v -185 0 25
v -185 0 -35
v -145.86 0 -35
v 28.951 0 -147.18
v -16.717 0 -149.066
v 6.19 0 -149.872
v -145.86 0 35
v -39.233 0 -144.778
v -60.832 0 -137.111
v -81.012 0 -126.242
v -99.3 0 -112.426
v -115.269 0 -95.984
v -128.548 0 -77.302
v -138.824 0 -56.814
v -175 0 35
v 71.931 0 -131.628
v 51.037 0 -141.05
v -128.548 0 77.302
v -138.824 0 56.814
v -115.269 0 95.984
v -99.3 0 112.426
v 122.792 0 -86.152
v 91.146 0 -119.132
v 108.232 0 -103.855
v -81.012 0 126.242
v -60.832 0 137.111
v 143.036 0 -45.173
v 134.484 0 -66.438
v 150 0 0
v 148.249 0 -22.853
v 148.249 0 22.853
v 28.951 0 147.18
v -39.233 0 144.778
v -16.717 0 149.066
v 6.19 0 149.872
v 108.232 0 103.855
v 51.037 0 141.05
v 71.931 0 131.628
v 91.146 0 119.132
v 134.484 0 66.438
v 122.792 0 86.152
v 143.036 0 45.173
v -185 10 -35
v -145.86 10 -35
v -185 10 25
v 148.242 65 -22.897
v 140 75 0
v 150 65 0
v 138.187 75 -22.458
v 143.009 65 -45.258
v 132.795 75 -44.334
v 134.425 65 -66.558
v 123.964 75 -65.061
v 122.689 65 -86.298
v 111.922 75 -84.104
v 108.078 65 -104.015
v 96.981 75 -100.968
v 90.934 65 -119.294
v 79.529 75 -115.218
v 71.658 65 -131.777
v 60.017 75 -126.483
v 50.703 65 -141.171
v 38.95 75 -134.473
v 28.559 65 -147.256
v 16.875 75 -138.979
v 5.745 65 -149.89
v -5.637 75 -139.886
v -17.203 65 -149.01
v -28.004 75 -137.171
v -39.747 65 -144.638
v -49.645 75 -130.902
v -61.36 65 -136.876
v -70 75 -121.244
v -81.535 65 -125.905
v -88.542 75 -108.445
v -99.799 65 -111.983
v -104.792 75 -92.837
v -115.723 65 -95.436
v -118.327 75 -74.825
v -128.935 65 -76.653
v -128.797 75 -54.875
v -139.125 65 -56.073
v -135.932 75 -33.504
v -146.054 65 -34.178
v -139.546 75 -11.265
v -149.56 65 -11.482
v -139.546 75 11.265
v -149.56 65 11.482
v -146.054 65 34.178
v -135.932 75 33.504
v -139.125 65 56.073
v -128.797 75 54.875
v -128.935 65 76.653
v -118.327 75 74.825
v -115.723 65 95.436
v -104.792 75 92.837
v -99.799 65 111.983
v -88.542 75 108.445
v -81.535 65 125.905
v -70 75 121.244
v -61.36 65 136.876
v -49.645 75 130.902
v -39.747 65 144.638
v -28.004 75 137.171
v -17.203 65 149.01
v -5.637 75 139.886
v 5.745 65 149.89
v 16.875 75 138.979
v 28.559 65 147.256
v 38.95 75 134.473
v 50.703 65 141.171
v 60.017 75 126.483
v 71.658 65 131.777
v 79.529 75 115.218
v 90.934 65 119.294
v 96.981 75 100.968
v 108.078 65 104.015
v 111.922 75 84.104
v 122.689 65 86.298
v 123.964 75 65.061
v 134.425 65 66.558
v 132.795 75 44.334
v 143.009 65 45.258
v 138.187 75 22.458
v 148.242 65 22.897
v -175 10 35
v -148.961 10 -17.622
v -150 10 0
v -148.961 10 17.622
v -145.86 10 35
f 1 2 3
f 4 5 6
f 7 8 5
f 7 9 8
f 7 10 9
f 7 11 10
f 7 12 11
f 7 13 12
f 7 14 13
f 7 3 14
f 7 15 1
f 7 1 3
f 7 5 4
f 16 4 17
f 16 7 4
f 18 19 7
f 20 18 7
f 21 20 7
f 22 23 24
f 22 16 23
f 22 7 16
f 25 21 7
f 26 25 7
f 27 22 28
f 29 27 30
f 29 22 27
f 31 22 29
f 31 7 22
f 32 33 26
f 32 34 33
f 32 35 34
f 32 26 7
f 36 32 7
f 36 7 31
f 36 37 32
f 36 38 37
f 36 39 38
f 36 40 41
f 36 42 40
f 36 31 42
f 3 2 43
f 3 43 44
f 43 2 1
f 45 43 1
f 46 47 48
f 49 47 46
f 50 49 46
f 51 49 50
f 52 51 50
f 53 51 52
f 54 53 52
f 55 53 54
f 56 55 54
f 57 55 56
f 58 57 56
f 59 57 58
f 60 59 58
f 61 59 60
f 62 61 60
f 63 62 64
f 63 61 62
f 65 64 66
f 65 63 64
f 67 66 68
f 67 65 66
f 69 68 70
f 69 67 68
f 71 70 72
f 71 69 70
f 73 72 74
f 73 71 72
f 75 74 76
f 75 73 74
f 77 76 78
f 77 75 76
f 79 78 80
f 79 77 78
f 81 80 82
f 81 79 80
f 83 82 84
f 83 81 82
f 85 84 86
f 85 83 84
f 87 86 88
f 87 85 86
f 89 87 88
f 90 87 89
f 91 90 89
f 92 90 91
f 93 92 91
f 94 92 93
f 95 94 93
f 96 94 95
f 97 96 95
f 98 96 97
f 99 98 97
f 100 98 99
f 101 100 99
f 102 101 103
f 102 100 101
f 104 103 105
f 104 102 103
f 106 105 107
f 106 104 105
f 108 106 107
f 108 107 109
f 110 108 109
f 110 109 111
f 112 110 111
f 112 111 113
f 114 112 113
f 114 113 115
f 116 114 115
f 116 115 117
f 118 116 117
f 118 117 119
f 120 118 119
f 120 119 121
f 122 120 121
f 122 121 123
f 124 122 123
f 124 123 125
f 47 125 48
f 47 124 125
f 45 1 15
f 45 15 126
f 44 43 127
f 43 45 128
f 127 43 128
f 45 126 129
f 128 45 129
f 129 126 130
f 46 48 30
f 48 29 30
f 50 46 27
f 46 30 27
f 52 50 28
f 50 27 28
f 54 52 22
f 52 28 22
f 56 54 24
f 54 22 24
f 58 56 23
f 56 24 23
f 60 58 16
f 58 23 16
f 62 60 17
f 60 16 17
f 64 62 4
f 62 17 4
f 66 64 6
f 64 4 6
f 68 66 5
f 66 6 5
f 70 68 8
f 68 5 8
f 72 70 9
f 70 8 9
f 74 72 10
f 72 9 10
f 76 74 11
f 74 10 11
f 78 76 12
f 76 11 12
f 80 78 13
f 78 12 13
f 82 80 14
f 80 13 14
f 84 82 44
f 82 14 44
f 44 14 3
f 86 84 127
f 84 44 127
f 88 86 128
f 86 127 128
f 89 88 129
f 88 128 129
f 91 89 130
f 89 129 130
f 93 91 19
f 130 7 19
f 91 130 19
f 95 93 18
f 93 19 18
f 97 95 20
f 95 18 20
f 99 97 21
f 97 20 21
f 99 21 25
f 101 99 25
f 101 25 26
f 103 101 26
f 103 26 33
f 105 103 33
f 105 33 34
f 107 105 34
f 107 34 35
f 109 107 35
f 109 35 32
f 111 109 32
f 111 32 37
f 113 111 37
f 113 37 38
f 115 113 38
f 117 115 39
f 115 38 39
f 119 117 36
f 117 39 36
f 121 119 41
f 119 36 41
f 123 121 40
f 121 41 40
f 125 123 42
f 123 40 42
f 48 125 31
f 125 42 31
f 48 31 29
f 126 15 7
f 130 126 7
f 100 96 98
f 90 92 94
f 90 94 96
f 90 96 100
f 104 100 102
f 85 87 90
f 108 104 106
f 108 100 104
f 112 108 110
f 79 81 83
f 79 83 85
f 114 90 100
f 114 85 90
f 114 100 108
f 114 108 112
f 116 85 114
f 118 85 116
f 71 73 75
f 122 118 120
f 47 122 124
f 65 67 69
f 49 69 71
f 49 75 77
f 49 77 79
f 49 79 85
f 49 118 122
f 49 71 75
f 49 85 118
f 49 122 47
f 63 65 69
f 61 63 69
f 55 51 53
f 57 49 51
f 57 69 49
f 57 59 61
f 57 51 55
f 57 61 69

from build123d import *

# Parameters (mm, degrees)
SKETCH1_R           = 150
BOSS_EXTRUDE1_DEPTH = 75
CHAMFER1_SIZE       = 10
SKETCH2_W           = 70
SKETCH2_H           = 70
BOSS_EXTRUDE2_DEPTH = 10
CHAMFER2_SIZE       = 10


with BuildPart() as part:
    # Sketch1 → Boss-Extrude1 (new body)
    with BuildSketch(Plane(origin=(0, 0, 0), x_dir=(1, 0, 0), z_dir=(0, 1, 0))):
        Circle(SKETCH1_R)
    extrude(amount=BOSS_EXTRUDE1_DEPTH)

    # Chamfer1
    chamfer1_edges = [part.edges().sort_by_distance(p)[0] for p in [
        (-150, 75, 0),
    ]]
    chamfer(chamfer1_edges, length=CHAMFER1_SIZE)

    # Sketch2 → Boss-Extrude2 (add)
    with BuildSketch(Plane.XZ):
        with Locations((-150, 0)):
            Rectangle(SKETCH2_W, SKETCH2_H)
    extrude(amount=-BOSS_EXTRUDE2_DEPTH)

    # Chamfer2
    chamfer2_edges = [part.edges().sort_by_distance(p)[0] for p in [
        (-185, 5, 35),
    ]]
    chamfer(chamfer2_edges, length=CHAMFER2_SIZE)


solid = part.part
